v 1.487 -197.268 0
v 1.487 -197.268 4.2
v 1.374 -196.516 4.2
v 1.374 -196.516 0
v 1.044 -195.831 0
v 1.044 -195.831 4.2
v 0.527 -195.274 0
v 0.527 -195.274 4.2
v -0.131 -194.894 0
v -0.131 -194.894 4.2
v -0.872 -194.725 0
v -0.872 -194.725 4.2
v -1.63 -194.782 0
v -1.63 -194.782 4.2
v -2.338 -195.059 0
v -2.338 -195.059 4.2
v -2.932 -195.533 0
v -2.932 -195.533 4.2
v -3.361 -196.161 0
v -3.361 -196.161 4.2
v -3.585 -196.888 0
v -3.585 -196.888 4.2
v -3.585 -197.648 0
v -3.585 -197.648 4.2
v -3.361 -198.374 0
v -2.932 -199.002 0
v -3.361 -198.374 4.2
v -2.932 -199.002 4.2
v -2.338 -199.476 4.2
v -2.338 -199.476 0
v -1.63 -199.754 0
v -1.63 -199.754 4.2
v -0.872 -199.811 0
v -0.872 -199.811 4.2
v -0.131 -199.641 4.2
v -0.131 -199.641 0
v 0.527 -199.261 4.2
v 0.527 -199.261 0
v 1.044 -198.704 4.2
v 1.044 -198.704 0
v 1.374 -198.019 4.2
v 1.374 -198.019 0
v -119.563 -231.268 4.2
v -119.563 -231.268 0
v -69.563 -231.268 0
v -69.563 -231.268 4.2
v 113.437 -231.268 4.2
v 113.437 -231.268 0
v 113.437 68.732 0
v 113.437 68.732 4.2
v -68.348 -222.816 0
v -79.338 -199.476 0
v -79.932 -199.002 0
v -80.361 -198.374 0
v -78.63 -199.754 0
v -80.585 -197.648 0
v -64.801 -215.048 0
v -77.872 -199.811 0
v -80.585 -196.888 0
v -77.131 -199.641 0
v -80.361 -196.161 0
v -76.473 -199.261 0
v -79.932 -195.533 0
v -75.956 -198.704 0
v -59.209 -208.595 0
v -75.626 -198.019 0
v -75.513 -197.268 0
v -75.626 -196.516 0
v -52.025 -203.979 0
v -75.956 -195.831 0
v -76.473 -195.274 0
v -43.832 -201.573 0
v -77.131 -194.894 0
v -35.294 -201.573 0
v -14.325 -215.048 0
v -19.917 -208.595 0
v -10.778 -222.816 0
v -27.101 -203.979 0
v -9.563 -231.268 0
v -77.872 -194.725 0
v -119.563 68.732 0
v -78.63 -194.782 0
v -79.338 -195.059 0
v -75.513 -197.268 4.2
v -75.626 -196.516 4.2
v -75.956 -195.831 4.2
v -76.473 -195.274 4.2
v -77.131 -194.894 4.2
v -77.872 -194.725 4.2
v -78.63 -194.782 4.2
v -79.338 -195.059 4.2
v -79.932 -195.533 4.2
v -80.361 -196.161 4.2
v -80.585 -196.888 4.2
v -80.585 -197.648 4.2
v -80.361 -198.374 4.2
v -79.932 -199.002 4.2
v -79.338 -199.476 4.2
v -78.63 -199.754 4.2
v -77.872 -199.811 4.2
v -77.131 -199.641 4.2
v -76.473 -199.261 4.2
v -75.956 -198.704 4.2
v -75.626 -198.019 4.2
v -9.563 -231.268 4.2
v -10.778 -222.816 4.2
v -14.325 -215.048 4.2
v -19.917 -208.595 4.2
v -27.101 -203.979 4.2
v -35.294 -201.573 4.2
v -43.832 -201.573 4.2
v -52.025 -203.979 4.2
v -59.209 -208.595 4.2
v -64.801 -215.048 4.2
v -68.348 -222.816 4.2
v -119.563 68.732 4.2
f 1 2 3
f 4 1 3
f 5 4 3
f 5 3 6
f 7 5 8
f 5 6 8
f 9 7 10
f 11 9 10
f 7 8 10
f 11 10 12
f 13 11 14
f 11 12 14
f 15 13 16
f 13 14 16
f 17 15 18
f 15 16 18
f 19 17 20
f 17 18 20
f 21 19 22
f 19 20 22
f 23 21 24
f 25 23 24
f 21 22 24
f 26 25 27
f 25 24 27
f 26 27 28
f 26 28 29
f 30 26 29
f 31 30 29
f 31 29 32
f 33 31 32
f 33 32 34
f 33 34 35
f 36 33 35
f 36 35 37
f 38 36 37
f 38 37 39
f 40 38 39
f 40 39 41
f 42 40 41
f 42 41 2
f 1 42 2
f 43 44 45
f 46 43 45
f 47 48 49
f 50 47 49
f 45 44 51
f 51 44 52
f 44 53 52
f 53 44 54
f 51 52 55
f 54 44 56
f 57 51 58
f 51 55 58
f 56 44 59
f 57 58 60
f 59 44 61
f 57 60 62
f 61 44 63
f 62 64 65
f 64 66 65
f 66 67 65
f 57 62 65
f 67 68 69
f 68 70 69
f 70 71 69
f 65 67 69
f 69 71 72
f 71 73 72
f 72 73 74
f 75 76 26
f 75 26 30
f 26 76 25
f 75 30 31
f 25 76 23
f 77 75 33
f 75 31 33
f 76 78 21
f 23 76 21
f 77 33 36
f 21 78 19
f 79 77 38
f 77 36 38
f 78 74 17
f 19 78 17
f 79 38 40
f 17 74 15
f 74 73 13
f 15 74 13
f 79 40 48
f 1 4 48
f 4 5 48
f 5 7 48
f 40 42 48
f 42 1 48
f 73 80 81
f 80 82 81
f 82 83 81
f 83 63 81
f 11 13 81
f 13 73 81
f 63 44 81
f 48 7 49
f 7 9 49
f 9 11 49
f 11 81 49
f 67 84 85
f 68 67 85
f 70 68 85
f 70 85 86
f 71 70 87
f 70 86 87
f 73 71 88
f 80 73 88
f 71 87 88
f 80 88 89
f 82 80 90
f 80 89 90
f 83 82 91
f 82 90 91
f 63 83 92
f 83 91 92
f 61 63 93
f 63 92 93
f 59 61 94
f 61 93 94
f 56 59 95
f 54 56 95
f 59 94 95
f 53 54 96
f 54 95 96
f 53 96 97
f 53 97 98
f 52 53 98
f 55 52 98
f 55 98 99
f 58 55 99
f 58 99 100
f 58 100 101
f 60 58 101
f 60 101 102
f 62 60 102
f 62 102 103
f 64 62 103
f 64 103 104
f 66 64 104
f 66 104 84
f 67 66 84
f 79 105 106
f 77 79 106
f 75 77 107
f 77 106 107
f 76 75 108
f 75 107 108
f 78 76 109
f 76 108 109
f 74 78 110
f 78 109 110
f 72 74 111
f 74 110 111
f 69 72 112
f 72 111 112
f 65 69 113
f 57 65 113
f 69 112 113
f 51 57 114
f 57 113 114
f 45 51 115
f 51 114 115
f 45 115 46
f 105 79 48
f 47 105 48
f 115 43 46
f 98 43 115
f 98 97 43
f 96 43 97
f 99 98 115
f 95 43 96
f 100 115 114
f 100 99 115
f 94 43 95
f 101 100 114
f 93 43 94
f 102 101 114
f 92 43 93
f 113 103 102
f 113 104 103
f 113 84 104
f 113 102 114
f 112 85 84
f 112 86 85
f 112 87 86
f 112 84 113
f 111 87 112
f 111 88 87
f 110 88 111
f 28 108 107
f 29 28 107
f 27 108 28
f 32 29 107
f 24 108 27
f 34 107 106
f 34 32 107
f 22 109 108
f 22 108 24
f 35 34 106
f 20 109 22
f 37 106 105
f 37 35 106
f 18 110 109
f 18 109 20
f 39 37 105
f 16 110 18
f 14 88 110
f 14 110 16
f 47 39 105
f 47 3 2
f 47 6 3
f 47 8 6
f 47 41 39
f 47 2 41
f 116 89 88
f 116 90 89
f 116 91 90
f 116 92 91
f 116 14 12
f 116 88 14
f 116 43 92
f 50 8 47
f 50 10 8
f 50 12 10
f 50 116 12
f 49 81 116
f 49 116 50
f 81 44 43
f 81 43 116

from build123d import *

# Parameters (mm, degrees)
ESQUISSE1_W             = 233
ESQUISSE1_H             = 300
BOSS_EXTRU_1_DEPTH      = 4.2
ESQUISSE2_R             = 2.55
ENL_V_MAT_EXTRU_1_DEPTH = 5.2


with BuildPart() as part:
    # Esquisse1 → Boss.-Extru.1 (new body)
    with BuildSketch(Plane.XY):
        with Locations((-3.063037439, -81.267653759)):
            Rectangle(ESQUISSE1_W, ESQUISSE1_H)
    extrude(amount=BOSS_EXTRU_1_DEPTH)

    # Esquisse2 → Enlèv. mat.-Extru.1 (cut, through all)
    with BuildSketch(Plane.XY.offset(4.2)):
        with Locations((-78.063037439, -197.267653759)):
            Circle(ESQUISSE2_R)
        with Locations((-1.063037439, -197.267653759)):
            Circle(ESQUISSE2_R)
        with BuildLine():
            Line((-69.563037439, -231.267653759), (-9.563037439, -231.267653759))
            ThreePointArc((-9.563037439, -231.267653759), (-39.563037439, -201.267653759), (-69.563037439, -231.267653759))
        make_face()
    extrude(amount=-ENL_V_MAT_EXTRU_1_DEPTH, mode=Mode.SUBTRACT)


solid = part.part
